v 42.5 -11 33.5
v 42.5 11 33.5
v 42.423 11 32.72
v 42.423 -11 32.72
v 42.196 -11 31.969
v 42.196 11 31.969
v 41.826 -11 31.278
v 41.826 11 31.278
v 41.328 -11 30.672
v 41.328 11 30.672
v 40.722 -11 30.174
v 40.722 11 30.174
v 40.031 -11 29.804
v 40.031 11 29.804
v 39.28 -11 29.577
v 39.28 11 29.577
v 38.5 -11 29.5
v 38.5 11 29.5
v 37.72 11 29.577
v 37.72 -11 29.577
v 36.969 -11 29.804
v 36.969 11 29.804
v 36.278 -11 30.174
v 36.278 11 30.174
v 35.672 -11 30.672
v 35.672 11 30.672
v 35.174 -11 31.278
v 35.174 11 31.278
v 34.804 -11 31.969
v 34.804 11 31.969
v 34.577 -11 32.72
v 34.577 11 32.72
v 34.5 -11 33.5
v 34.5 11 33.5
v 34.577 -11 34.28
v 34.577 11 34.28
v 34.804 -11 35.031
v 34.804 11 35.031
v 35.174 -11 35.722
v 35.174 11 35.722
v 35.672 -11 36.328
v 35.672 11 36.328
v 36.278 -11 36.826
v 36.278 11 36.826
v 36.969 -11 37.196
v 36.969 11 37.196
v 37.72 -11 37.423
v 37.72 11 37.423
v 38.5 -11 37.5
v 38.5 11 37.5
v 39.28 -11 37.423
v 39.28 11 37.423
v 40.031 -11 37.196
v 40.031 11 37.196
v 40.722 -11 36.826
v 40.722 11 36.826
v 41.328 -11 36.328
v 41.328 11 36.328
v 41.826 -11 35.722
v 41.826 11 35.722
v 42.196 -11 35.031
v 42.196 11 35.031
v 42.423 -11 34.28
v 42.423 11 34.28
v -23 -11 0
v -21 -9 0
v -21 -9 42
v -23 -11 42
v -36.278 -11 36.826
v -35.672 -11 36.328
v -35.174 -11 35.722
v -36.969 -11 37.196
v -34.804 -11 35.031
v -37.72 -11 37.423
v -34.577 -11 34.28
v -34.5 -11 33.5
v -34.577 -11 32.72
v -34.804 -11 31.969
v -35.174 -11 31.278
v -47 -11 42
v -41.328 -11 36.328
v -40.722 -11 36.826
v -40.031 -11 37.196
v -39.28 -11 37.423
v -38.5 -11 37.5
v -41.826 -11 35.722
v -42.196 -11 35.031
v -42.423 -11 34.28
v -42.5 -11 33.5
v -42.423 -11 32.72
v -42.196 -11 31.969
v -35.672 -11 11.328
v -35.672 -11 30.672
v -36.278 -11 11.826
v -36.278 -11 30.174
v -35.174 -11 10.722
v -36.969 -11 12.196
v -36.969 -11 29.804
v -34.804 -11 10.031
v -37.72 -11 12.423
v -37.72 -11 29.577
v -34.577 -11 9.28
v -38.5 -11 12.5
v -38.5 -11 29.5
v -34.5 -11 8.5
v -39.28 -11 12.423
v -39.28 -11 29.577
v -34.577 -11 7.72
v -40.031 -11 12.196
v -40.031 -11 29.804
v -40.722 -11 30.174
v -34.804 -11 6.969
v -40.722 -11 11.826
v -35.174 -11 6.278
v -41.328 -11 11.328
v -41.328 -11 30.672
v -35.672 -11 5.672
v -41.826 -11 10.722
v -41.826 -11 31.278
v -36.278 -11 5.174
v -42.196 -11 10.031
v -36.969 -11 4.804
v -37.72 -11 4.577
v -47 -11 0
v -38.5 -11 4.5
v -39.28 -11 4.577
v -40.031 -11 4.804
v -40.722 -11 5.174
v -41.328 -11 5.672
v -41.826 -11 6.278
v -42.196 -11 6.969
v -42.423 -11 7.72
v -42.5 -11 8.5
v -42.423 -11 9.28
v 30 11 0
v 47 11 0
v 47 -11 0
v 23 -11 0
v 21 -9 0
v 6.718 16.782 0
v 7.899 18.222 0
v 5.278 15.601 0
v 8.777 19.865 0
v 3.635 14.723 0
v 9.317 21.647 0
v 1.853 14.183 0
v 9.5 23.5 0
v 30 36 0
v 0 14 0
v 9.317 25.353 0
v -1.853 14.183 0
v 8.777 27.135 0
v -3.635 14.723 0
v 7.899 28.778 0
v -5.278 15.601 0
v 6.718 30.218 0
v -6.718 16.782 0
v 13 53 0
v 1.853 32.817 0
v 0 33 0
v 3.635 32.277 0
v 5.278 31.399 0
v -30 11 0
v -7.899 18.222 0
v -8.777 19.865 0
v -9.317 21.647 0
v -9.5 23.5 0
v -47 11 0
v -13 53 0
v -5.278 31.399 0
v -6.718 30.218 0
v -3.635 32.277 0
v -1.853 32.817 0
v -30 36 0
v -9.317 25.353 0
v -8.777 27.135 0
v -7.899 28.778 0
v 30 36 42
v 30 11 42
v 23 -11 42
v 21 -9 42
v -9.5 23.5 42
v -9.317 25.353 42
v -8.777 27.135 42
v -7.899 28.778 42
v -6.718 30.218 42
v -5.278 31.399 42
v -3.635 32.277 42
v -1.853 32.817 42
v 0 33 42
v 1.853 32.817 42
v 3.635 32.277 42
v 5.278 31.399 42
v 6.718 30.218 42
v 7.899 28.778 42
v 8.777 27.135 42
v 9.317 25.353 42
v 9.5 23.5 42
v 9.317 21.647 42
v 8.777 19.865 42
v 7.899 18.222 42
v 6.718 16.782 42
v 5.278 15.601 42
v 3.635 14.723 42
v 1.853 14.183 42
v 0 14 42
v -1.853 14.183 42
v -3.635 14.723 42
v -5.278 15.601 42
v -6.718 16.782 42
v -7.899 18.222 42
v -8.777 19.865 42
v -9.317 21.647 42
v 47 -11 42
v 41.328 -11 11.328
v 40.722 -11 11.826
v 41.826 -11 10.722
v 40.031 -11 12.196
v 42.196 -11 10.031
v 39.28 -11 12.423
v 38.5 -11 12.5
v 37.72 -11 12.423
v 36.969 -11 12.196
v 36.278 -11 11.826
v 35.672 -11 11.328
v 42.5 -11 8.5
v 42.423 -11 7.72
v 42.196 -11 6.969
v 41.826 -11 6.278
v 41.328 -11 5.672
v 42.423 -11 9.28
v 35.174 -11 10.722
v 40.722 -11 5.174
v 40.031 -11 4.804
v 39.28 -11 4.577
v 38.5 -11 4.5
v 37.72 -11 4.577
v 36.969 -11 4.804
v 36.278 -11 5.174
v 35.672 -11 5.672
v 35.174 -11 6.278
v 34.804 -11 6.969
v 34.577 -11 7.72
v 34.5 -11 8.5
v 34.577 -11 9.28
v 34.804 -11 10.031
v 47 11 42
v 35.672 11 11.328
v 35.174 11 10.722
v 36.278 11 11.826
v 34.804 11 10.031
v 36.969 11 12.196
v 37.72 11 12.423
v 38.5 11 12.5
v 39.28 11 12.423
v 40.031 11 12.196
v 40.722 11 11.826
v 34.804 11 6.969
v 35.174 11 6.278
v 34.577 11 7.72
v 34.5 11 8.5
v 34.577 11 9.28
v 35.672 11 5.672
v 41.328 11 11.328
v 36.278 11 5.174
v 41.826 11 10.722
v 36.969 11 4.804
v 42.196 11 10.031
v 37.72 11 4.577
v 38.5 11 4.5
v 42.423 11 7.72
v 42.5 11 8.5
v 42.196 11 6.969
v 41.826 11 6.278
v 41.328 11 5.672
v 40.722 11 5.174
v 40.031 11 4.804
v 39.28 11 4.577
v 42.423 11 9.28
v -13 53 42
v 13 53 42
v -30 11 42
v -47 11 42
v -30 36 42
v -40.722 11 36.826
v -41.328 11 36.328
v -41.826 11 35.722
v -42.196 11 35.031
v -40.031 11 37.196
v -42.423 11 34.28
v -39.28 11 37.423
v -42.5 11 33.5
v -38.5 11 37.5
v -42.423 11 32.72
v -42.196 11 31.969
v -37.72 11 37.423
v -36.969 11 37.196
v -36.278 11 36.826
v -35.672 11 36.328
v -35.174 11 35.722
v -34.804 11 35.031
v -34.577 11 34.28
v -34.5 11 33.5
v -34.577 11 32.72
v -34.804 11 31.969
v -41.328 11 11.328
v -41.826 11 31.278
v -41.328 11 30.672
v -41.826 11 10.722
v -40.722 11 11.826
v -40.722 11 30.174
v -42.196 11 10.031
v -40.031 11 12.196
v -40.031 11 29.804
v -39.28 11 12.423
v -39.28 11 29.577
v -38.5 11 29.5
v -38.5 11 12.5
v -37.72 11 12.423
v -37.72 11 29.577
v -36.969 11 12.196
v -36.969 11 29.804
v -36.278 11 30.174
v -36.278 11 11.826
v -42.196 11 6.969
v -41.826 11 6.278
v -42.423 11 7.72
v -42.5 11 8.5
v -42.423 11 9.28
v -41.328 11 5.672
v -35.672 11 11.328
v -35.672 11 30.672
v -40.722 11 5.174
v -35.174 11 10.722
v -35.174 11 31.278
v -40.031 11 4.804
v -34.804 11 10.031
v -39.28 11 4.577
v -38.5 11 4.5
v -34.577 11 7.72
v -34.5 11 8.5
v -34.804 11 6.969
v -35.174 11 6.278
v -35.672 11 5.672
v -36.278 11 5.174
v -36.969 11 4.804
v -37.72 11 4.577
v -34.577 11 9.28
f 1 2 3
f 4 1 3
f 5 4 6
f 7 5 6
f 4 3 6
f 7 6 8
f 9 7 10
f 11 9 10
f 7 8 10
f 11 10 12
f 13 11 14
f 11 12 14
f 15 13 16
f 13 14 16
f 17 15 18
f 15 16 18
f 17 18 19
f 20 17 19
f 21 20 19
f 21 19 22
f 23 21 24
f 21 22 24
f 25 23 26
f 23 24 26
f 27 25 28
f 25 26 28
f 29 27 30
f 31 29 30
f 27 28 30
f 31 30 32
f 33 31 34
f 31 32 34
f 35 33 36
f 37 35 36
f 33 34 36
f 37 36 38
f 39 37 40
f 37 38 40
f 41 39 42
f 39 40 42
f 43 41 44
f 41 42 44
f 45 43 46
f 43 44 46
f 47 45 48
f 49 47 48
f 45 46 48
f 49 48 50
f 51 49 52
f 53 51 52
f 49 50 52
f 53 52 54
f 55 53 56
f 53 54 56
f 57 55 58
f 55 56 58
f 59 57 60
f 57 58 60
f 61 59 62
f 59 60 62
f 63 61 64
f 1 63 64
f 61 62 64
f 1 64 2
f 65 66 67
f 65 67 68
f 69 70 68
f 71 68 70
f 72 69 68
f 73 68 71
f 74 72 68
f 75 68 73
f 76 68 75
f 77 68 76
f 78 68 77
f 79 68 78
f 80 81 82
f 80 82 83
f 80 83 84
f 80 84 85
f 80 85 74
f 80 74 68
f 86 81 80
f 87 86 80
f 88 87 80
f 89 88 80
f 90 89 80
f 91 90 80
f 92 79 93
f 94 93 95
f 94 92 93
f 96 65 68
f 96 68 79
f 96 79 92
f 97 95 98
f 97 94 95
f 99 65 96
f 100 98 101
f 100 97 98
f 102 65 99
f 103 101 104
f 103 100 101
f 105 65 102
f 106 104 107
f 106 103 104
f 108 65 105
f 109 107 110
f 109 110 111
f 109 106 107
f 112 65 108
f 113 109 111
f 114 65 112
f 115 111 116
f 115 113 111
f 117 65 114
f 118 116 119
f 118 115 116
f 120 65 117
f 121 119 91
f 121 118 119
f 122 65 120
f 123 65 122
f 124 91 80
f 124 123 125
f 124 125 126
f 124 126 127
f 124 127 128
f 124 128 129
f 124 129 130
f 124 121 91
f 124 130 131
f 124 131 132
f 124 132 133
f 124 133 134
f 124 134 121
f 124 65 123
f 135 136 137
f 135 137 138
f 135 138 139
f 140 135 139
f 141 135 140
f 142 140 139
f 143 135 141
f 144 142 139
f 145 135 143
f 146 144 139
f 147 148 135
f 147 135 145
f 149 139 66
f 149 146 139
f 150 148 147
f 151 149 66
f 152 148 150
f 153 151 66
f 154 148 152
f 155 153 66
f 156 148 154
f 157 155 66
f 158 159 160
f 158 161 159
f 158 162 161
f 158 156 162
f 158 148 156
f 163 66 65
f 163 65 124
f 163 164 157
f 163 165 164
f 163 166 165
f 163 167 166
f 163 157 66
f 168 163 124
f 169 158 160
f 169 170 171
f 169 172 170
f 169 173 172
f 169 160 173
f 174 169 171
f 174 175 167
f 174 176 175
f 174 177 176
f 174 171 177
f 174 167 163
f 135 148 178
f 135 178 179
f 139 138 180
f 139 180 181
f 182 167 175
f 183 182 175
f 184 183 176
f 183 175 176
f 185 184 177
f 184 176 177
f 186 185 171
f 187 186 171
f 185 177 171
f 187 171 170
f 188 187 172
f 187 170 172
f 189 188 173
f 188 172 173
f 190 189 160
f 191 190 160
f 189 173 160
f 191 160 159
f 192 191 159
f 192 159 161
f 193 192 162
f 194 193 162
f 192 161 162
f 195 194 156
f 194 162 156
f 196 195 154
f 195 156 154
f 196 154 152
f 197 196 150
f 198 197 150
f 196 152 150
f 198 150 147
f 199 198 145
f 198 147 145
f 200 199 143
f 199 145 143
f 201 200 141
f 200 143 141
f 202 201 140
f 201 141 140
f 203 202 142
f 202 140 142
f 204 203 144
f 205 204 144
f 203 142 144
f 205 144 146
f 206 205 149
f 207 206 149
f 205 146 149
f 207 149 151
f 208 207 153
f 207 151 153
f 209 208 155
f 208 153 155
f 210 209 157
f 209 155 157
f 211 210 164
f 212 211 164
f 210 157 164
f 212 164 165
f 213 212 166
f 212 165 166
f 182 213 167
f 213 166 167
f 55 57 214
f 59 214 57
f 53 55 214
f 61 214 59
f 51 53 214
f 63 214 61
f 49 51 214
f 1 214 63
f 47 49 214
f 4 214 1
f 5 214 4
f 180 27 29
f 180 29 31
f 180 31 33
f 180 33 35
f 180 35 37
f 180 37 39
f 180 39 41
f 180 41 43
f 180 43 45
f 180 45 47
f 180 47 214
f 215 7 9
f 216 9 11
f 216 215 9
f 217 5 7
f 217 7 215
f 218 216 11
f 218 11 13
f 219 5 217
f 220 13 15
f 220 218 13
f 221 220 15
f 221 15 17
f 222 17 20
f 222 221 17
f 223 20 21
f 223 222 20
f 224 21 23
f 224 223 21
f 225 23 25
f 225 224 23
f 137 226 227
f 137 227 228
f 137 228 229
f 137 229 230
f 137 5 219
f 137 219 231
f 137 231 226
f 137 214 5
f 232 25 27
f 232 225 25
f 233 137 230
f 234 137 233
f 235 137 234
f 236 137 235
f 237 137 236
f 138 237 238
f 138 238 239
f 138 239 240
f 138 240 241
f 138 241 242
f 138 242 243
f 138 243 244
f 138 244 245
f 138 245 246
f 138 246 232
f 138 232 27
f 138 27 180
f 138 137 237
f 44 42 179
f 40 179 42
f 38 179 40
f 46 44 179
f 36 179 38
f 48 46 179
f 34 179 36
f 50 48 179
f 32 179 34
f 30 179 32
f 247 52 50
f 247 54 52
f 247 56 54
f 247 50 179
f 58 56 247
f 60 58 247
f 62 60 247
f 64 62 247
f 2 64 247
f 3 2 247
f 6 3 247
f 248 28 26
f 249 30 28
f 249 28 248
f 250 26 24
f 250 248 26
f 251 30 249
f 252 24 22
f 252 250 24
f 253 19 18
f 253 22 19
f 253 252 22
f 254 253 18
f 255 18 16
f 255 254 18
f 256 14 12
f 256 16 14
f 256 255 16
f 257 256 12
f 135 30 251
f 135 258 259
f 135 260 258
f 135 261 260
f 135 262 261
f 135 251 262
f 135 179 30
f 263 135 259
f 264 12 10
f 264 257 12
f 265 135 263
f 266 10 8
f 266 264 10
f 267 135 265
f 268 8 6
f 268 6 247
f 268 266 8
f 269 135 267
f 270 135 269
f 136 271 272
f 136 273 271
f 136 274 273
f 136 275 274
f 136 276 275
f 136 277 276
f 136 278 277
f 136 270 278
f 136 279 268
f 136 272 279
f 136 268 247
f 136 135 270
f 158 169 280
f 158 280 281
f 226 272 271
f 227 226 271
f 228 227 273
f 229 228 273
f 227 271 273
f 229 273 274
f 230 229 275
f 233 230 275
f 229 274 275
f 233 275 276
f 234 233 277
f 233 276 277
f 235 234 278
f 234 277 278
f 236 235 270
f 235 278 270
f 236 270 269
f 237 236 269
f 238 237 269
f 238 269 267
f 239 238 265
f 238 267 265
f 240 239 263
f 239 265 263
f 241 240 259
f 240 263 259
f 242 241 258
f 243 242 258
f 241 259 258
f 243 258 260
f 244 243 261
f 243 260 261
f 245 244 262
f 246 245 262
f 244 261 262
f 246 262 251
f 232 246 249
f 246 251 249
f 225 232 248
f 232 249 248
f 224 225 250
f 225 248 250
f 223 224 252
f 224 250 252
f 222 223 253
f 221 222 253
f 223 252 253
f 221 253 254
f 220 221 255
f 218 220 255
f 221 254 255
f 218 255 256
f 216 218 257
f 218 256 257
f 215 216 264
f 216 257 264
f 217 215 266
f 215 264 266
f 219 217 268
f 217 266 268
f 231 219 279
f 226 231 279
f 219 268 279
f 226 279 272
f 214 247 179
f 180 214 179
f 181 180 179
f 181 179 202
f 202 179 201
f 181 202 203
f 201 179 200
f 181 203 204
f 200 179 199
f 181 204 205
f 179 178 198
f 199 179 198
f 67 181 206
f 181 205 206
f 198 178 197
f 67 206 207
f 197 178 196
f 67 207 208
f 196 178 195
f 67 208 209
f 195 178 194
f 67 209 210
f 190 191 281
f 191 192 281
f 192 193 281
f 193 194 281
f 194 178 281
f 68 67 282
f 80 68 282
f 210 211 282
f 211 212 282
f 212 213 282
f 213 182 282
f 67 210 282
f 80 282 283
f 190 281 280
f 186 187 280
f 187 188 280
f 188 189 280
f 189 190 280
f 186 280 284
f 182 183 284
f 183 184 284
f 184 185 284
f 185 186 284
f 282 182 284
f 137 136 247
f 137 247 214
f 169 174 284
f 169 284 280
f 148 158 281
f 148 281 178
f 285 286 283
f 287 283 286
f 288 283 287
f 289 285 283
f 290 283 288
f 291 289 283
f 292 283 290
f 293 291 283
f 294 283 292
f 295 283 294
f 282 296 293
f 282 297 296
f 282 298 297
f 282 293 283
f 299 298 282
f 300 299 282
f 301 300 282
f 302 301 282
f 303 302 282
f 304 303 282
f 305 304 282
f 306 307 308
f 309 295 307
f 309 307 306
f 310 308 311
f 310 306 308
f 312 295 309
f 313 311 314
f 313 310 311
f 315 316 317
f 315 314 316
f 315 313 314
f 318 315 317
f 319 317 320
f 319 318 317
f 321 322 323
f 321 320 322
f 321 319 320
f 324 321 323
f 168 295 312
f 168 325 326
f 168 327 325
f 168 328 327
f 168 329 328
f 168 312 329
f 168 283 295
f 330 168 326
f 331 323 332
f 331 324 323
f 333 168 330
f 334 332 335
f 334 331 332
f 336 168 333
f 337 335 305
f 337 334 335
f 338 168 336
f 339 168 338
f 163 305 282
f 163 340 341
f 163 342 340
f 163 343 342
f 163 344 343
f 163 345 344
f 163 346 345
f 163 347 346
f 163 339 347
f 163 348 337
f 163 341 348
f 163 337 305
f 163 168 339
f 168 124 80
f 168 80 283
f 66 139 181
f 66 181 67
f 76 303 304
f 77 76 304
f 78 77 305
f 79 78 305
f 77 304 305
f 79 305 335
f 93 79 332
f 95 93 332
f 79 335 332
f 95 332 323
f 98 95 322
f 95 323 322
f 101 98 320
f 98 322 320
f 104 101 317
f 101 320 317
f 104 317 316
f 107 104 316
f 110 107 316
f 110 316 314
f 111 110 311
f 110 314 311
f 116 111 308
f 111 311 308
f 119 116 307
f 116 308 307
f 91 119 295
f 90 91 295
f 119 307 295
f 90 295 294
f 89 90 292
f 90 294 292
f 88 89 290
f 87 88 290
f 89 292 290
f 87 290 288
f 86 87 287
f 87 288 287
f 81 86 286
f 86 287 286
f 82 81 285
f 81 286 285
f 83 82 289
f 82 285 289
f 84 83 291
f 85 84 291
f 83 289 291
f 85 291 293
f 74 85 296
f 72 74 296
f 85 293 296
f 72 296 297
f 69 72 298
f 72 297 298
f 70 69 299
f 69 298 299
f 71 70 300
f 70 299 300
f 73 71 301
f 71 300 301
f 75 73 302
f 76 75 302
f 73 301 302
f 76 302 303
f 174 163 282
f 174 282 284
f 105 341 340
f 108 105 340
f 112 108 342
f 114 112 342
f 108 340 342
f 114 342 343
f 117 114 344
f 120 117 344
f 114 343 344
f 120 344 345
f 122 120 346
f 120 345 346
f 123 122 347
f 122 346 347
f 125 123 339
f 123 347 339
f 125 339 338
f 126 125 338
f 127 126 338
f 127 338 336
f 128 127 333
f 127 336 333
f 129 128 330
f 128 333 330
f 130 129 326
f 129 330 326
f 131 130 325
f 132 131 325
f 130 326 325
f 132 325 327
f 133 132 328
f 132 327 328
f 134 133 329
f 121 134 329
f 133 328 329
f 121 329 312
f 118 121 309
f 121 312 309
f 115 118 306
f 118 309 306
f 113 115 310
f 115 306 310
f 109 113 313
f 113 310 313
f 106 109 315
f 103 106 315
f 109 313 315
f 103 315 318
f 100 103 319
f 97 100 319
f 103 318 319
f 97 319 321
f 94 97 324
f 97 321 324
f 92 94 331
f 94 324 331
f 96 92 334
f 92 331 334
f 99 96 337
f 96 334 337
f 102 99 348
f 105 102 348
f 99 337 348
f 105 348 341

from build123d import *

# Parameters (mm, degrees)
DODANIE_WYCI_GNI_CIE1_DEPTH = 42
SZKIC2_R                    = 9.5
WYTNIJ_WYCI_GNI_CIE1_DEPTH  = 42
SZKIC3_R                    = 4
WYTNIJ_WYCI_GNI_CIE2_DEPTH  = 22


with BuildPart() as part:
    # Szkic1 → Dodanie-wyciągnięcie1 (new body)
    with BuildSketch(Plane.XY):
        Polygon((-47, 11), (-30, 11), (-30, 36), (-13, 53), (13, 53), (30, 36), (30, 11), (47, 11), (47, -11), (23, -11), (21, -9), (-21, -9), (-23, -11), (-47, -11), align=None)
    extrude(amount=DODANIE_WYCI_GNI_CIE1_DEPTH)

    # Szkic2 → Wytnij-wyciągnięcie1 (cut)
    with BuildSketch(Plane(origin=(0, 0, 0), x_dir=(-1, 0, 0), z_dir=(0, 0, -1))):
        with Locations((0, 23.5)):
            Circle(SZKIC2_R)
    extrude(amount=-WYTNIJ_WYCI_GNI_CIE1_DEPTH, mode=Mode.SUBTRACT)

    # Szkic3 → Wytnij-wyciągnięcie2 (cut)
    with BuildSketch(Plane(origin=(0, 11, 0), x_dir=(1, 0, 0), z_dir=(0, 1, 0))):
        with Locations((-38.5, -8.5)):
            Circle(SZKIC3_R)
        with Locations((-38.5, -33.5)):
            Circle(SZKIC3_R)
        with Locations((38.5, -33.5)):
            Circle(SZKIC3_R)
        with Locations((38.5, -8.5)):
            Circle(SZKIC3_R)
    extrude(amount=-WYTNIJ_WYCI_GNI_CIE2_DEPTH, mode=Mode.SUBTRACT)


solid = part.part
